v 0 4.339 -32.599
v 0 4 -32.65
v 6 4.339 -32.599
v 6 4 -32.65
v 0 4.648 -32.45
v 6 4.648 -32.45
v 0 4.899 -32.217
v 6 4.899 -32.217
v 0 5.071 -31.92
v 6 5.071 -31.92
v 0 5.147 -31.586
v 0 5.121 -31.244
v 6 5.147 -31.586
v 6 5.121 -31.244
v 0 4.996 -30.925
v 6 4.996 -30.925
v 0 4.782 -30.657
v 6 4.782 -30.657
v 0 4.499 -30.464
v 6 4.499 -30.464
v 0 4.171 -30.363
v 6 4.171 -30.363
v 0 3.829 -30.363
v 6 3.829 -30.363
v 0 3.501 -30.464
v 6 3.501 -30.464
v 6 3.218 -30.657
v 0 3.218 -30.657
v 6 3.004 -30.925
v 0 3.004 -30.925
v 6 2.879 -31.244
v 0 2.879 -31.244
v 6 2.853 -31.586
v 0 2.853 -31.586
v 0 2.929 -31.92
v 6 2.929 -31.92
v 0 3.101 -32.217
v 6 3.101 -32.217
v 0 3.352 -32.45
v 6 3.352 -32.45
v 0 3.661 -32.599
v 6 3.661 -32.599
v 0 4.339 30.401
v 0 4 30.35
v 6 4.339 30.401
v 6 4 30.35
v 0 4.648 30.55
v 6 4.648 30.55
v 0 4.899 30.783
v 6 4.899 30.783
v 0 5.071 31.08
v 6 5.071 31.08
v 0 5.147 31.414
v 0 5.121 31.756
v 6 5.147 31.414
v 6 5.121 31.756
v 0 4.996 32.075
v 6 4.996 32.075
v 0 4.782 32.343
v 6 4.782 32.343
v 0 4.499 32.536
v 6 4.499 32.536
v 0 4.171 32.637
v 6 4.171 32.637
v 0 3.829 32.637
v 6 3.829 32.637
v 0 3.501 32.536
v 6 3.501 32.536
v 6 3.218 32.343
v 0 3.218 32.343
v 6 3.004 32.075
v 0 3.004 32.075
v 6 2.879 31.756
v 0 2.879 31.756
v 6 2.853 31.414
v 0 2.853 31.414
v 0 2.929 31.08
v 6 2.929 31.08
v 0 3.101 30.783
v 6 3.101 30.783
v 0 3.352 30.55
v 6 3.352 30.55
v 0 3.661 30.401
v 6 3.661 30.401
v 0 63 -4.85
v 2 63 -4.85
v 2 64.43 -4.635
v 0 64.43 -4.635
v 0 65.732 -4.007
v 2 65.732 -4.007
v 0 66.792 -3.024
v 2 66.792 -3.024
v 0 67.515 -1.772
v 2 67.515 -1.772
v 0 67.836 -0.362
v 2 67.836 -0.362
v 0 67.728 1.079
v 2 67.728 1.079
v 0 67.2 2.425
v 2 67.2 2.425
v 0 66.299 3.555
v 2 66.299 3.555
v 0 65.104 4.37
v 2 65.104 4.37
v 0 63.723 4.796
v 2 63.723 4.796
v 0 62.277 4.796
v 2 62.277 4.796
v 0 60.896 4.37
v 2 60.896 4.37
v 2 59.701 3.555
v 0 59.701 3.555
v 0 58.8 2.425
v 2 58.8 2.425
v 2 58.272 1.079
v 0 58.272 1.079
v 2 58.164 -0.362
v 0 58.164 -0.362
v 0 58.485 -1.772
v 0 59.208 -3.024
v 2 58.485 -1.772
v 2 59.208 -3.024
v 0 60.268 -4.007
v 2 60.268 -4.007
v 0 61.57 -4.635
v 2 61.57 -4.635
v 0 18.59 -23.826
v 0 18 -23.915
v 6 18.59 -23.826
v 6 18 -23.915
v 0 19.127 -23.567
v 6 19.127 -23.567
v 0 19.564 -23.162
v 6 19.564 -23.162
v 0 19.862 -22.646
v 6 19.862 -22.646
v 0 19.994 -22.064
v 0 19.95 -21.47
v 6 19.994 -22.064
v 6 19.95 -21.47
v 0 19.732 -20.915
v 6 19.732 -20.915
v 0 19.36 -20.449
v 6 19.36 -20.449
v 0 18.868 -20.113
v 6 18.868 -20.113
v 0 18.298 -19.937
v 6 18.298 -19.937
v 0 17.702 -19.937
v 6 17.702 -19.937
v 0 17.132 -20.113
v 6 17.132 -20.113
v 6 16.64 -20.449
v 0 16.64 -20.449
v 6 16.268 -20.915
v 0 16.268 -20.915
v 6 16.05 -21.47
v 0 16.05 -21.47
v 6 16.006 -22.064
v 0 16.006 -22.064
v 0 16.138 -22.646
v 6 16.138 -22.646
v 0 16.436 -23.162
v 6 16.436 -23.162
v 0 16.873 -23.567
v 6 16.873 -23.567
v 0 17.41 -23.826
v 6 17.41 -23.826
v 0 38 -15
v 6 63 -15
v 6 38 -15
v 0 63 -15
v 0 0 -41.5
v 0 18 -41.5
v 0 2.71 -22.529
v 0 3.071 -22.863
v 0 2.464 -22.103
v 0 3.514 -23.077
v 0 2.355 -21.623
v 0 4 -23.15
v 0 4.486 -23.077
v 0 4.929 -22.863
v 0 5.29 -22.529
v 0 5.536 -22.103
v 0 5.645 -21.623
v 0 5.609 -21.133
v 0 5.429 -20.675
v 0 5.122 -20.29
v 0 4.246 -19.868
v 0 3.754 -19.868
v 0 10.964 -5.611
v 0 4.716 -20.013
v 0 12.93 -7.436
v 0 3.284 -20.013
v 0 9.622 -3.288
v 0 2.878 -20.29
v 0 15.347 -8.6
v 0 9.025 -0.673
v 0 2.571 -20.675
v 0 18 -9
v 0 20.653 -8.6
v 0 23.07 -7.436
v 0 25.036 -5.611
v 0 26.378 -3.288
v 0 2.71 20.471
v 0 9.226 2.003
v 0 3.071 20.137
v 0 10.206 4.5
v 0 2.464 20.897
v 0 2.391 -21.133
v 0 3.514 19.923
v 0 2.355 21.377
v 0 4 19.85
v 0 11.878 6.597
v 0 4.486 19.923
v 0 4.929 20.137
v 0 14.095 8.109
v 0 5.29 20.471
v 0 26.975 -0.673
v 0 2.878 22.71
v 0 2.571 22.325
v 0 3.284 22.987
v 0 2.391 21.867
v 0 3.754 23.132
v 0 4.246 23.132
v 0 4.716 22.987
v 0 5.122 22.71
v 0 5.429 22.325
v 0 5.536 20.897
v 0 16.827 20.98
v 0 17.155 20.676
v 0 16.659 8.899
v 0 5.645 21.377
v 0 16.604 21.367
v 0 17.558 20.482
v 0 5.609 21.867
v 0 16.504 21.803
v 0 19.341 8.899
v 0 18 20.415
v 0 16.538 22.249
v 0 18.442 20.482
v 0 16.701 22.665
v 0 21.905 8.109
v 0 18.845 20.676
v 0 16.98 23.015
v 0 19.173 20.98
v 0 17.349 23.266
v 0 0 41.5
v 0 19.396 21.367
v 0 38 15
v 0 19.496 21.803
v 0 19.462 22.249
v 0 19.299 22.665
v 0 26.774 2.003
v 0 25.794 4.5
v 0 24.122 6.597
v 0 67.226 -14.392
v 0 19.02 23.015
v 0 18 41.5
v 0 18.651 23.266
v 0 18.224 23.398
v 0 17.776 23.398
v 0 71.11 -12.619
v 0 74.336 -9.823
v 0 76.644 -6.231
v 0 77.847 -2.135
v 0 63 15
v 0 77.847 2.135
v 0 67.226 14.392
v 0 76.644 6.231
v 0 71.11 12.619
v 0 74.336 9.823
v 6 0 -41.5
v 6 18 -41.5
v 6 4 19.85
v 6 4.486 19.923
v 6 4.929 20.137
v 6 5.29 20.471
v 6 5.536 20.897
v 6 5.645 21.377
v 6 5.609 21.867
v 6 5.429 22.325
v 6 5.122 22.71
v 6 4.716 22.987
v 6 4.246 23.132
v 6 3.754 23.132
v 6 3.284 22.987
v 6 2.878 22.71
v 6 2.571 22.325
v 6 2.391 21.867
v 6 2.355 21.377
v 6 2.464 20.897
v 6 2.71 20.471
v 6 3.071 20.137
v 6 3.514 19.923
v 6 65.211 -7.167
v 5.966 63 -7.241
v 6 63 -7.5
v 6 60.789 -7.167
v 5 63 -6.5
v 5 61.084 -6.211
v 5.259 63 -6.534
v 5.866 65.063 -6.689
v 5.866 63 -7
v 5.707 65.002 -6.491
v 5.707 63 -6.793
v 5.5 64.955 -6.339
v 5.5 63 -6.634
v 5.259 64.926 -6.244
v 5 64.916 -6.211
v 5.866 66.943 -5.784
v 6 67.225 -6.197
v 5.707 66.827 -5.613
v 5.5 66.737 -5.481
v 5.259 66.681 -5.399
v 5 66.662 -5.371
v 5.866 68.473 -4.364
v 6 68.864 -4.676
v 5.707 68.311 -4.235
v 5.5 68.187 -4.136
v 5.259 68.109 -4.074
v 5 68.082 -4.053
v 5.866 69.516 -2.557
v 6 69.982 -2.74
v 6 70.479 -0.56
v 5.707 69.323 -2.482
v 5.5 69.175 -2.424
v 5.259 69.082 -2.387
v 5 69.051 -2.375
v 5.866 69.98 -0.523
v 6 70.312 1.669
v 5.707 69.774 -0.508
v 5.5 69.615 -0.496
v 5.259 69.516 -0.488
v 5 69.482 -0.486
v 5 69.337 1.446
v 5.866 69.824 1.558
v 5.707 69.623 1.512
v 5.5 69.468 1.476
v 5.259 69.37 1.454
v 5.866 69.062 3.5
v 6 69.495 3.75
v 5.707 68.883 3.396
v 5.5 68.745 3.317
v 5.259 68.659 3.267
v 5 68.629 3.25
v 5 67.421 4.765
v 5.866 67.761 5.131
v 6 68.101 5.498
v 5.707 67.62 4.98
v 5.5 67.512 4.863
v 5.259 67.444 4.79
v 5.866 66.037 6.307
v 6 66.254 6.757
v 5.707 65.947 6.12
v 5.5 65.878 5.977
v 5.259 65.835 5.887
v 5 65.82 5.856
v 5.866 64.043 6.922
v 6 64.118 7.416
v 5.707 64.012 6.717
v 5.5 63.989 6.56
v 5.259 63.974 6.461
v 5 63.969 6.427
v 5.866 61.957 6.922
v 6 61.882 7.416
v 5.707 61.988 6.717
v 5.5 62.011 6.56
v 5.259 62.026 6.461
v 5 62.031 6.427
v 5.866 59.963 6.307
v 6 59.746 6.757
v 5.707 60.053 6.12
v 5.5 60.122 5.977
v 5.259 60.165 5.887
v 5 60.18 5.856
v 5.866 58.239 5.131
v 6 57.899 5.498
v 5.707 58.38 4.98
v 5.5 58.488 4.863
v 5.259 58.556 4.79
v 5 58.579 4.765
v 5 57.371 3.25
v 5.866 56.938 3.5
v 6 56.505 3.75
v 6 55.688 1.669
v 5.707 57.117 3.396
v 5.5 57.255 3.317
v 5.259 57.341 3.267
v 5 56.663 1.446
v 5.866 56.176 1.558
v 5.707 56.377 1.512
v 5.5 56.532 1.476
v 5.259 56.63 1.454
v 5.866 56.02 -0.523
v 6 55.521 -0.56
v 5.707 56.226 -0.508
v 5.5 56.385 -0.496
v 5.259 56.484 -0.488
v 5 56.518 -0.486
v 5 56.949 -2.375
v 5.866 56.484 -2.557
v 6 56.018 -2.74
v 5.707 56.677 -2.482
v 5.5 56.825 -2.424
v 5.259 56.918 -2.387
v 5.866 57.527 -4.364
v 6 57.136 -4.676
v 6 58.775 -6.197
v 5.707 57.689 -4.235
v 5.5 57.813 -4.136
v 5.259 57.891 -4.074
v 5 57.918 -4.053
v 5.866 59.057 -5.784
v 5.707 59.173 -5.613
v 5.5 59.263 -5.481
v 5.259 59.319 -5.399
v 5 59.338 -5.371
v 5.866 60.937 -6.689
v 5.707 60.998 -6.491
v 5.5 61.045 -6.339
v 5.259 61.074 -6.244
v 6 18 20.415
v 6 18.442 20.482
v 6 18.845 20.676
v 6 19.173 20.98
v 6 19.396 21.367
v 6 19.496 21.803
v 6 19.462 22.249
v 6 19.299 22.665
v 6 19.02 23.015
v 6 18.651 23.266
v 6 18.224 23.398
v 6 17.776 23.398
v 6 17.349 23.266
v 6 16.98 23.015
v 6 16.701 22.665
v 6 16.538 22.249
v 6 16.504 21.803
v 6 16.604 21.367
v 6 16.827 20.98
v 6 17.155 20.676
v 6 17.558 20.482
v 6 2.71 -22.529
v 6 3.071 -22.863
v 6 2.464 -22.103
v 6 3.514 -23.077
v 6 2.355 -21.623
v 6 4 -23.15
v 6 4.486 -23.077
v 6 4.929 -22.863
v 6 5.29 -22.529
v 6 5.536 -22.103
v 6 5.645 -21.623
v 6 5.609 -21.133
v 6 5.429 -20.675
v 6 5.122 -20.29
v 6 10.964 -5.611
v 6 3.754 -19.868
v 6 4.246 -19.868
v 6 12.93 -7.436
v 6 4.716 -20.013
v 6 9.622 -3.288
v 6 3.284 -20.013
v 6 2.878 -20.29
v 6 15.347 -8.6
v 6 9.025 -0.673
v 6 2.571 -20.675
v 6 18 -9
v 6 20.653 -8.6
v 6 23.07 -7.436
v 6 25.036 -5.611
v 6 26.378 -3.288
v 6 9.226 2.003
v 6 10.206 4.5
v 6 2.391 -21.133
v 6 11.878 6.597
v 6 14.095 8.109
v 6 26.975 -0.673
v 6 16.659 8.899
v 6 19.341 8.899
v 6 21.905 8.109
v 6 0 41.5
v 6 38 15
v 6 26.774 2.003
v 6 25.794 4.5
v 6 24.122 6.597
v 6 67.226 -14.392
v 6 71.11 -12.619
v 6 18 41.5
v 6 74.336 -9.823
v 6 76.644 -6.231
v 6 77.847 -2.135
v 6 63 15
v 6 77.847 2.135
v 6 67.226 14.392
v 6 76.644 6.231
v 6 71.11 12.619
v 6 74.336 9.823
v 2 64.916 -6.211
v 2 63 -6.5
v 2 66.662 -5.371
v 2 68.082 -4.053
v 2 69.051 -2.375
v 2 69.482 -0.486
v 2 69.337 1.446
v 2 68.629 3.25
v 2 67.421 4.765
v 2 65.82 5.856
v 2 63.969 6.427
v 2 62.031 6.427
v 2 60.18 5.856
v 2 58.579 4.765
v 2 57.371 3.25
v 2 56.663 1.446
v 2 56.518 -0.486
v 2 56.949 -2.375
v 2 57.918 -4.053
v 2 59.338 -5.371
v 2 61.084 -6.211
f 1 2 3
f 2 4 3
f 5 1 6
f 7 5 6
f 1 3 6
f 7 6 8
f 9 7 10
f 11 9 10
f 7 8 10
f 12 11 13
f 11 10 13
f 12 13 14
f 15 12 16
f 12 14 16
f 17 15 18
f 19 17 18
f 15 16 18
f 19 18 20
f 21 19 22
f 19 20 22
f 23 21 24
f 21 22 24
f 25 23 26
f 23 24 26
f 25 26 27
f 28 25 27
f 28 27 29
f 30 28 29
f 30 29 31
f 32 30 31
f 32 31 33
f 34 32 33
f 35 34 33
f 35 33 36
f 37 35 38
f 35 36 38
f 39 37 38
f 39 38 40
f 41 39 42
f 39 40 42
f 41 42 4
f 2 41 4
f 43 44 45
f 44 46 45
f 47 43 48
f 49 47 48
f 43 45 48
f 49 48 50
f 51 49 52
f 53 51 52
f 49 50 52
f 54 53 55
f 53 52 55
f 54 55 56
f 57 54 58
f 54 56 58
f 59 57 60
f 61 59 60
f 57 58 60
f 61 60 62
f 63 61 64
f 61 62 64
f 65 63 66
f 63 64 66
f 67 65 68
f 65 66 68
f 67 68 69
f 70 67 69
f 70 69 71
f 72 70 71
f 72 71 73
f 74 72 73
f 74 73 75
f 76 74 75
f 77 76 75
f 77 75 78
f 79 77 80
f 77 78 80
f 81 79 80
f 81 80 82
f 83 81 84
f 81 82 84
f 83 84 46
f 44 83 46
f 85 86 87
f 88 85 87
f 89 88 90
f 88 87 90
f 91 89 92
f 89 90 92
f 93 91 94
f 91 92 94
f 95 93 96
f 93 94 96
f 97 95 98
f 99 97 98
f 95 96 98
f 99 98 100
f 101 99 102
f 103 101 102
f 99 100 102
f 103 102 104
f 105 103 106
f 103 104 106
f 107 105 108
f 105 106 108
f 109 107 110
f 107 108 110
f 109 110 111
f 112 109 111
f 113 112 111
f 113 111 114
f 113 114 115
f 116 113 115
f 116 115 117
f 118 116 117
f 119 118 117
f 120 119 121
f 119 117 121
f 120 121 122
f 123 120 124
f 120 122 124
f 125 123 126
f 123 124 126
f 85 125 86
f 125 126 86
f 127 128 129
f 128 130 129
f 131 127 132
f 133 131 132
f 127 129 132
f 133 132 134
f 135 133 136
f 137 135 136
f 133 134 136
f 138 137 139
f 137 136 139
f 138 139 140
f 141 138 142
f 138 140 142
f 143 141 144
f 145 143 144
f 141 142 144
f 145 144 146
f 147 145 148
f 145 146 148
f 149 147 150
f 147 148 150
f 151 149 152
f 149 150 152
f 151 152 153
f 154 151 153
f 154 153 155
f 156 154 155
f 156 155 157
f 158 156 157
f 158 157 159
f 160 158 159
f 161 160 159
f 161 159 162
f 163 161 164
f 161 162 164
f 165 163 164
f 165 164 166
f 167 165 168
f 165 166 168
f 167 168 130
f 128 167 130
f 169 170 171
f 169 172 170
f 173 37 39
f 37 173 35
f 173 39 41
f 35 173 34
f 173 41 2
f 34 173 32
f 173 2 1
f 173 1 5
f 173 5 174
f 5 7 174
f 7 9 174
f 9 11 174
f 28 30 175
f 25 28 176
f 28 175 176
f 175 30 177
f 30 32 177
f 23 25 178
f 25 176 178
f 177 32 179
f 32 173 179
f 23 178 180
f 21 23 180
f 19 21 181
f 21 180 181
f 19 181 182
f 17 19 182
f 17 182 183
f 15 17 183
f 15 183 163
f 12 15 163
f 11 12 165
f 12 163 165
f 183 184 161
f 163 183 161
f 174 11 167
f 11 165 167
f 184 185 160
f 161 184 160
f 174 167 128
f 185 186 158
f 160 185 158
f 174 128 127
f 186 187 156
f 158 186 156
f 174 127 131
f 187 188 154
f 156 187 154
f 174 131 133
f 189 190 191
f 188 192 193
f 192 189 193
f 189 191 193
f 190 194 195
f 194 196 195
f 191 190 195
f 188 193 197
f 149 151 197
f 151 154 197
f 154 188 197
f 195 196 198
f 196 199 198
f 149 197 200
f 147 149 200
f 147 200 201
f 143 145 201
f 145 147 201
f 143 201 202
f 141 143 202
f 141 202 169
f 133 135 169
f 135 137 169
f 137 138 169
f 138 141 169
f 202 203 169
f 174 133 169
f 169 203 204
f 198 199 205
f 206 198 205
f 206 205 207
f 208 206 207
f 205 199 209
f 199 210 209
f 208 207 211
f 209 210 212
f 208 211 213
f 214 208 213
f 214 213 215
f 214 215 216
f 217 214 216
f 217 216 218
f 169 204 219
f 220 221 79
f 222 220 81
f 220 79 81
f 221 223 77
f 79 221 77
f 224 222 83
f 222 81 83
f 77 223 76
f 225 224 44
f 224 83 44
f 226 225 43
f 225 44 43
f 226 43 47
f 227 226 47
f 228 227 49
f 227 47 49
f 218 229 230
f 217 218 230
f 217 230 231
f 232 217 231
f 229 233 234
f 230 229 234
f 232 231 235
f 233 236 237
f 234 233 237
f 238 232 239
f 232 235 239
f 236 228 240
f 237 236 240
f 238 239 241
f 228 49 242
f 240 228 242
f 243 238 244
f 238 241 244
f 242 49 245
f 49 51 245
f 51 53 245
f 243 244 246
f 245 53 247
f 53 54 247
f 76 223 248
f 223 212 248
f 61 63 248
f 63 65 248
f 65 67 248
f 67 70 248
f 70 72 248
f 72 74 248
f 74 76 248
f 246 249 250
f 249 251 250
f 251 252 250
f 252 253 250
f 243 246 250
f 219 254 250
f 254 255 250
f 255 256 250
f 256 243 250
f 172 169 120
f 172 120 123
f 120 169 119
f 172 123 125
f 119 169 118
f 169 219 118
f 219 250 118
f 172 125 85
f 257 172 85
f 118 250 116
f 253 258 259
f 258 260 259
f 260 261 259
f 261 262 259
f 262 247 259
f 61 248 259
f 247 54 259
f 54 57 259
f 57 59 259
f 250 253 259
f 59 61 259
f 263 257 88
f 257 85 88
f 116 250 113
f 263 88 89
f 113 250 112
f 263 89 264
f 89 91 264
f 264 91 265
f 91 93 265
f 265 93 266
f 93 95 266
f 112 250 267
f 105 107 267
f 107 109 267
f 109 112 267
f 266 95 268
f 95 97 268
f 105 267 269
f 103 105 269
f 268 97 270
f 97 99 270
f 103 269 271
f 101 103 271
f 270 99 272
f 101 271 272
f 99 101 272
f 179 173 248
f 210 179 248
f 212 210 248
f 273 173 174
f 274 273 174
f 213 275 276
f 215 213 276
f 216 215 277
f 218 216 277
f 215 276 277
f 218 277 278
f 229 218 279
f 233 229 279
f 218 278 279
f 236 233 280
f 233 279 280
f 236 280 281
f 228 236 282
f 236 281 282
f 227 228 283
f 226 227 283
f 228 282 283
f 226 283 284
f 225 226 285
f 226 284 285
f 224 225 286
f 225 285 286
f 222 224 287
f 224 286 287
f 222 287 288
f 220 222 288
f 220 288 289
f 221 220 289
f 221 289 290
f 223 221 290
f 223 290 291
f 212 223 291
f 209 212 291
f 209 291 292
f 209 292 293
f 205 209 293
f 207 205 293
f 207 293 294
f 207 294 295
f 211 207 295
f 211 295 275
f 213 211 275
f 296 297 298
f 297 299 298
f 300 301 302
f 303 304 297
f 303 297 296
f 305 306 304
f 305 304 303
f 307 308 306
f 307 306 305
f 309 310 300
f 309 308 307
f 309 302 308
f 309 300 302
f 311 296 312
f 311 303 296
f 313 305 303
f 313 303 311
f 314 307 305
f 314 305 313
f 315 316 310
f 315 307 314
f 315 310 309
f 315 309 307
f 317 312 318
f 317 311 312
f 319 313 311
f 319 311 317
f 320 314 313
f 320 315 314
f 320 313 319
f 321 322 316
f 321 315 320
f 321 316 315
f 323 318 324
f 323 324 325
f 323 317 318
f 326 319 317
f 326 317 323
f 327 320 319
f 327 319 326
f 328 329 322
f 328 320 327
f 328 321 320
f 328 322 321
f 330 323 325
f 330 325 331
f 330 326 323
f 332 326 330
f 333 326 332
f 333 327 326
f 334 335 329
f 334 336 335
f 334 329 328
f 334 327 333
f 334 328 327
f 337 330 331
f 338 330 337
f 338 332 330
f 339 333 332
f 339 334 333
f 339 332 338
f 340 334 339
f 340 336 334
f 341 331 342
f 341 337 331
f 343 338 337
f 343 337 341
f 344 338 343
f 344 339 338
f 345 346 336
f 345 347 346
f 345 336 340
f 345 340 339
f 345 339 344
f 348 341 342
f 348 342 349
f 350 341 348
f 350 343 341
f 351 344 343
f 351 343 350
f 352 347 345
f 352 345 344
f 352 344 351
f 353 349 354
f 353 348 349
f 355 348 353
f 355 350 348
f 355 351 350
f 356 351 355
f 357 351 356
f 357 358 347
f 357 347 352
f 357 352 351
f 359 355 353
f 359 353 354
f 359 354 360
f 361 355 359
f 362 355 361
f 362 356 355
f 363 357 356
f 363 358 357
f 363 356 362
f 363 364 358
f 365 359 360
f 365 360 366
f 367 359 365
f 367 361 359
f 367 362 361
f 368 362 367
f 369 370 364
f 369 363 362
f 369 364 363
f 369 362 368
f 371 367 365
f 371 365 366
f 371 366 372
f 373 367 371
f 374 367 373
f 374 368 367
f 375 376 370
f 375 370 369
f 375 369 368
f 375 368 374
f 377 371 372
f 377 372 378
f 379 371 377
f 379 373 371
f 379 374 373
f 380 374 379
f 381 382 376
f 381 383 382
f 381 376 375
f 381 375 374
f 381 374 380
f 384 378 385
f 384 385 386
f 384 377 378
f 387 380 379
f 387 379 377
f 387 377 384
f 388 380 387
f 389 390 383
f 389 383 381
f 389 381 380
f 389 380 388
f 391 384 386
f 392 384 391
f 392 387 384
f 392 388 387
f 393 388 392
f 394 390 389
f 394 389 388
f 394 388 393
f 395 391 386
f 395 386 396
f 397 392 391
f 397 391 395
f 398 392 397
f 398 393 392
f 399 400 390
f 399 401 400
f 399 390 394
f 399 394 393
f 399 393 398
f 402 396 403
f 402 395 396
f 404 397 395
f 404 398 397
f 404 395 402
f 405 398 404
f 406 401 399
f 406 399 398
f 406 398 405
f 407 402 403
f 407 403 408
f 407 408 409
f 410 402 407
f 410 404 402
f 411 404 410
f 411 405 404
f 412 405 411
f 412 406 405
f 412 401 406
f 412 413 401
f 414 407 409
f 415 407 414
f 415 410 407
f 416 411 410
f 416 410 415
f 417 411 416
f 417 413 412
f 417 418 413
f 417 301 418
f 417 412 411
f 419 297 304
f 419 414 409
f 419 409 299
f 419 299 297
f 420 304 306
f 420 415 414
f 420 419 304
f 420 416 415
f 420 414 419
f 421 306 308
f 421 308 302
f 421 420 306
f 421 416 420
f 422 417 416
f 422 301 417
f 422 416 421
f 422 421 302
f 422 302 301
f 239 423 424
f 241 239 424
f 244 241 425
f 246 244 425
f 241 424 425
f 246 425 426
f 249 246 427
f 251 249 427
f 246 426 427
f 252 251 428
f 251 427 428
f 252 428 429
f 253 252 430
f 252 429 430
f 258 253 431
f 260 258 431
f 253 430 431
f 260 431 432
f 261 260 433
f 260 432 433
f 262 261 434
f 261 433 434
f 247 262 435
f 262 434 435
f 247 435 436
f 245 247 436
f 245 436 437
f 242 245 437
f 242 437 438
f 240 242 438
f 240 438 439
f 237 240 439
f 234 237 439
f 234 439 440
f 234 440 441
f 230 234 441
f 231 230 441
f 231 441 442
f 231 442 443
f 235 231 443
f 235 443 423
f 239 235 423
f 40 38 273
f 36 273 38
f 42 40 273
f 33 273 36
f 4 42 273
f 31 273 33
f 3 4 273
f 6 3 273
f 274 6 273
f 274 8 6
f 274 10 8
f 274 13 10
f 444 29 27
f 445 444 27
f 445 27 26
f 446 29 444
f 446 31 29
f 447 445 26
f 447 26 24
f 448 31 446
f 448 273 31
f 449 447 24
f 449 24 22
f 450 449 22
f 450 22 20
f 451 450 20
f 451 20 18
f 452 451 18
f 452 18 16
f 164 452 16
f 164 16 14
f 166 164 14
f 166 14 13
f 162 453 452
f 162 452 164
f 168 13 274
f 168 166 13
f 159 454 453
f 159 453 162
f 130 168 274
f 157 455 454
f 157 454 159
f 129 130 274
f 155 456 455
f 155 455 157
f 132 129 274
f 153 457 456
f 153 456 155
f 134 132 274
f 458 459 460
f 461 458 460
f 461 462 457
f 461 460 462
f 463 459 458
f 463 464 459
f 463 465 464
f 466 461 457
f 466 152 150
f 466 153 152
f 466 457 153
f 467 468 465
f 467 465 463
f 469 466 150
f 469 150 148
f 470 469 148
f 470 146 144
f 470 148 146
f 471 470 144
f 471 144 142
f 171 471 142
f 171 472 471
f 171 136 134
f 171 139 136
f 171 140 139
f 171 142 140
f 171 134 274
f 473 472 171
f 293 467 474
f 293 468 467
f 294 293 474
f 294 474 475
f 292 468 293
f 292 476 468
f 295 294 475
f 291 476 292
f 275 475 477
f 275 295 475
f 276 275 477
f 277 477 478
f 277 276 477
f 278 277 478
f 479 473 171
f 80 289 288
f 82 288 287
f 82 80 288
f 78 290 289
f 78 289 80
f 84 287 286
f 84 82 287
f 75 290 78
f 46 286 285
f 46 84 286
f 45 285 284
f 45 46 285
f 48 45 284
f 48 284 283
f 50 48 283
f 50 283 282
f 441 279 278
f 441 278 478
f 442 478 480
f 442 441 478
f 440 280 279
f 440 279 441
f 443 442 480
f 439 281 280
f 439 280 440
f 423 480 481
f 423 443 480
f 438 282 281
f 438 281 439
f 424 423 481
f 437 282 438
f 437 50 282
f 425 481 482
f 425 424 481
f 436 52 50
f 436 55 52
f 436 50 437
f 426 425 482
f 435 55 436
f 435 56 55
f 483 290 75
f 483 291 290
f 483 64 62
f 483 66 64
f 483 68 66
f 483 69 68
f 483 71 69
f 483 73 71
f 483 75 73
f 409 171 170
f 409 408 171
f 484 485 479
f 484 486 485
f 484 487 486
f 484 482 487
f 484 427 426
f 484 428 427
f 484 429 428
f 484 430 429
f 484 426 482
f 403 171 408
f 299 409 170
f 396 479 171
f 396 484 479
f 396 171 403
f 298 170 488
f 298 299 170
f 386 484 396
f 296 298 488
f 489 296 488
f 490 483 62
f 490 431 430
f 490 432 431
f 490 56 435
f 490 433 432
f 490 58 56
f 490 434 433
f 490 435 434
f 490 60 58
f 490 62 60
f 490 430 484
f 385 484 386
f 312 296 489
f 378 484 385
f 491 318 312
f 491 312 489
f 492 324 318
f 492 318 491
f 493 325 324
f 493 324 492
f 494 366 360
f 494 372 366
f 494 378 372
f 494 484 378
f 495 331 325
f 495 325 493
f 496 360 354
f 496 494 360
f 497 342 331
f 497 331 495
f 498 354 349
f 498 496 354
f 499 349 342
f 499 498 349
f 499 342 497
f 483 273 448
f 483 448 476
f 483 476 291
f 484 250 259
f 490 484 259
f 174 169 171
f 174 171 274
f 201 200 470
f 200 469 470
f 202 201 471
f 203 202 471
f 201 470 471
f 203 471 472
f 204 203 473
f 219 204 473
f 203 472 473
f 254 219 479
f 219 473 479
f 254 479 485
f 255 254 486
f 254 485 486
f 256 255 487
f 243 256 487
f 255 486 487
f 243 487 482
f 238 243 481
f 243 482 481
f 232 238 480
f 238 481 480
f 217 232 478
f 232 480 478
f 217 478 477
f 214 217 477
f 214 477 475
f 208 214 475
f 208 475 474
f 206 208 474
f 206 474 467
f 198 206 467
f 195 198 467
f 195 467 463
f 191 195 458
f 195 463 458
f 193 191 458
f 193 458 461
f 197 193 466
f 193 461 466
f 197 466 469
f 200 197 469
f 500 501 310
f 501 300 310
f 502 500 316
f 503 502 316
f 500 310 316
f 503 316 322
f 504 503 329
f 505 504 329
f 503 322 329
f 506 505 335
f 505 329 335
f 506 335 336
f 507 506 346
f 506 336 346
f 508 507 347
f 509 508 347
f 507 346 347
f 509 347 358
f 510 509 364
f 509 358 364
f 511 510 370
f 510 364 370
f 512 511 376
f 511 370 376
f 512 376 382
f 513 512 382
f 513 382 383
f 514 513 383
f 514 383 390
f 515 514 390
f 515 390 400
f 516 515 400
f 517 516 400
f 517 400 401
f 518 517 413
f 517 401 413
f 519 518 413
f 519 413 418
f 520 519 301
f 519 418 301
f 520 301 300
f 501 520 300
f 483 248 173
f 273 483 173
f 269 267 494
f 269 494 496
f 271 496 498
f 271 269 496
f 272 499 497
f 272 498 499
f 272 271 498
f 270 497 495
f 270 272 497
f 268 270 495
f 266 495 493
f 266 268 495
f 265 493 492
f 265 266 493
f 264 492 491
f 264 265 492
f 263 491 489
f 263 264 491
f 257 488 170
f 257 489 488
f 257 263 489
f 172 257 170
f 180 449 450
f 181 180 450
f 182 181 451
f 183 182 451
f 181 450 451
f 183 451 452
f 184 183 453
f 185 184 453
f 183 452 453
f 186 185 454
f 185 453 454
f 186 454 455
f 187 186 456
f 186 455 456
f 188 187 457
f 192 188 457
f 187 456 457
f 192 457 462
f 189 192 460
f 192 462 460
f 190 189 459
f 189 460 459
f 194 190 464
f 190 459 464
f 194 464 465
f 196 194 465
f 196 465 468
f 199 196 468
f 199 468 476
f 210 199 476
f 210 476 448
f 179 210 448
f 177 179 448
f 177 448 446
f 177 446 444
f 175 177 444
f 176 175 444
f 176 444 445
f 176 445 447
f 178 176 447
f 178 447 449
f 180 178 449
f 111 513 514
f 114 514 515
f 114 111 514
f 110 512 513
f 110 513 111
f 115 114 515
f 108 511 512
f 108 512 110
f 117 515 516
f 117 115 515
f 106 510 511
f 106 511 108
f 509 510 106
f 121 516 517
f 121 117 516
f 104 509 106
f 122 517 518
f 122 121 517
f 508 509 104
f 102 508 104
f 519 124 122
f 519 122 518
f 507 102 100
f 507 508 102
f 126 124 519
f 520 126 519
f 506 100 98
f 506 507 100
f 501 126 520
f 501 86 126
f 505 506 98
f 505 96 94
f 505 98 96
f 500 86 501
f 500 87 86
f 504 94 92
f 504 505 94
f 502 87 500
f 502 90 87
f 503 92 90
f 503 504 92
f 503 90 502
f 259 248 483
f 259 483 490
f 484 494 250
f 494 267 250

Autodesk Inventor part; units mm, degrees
ref_plane "YZ Plane" through (0, 0, 0) normal (1, 0, 0) x (0, 1, 0)
ref_plane "XZ Plane" through (0, 0, 0) normal (0, 1, 0) x (-1, 0, 0)
ref_plane "XY Plane" through (0, 0, 0) normal (0, 0, 1) x (1, 0, 0)
sketch "스케치1" plane through (0, 0, 0) normal (1, 0, 0) x (0, 1, 0)
  line L0 (0, -41.5) -> (18, -41.5)
  line L1 (18, -41.5) -> (18, 59.6584) construction
  line L2 (0, 0) -> (0, -41.5)
  line L3 (84.3904, 0) -> (-15.1692, 0) construction
  arc A0 (63, -15) -> (78, 0) centre (63, 0) ccw
  line L4 (63, -15) -> (38, -15)
  line L5 (38, -15) -> (18, -41.5)
  line L6 (0, 41.5) -> (18, 41.5)
  line L7 (0, 0) -> (0, 41.5)
  arc A1 (78, 0) -> (63, 15) centre (63, 0) ccw
  line L8 (63, 15) -> (38, 15)
  line L9 (38, 15) -> (18, 41.5)
  dimension "d0" = 18
  dimension "d8" = 45
  dimension "d9" = 25
extrude "돌출1" add sketch "스케치1" along normal blind 6
sketch "스케치2" plane through (6, 0, 0) normal (1, 0, 0) x (0, 0, -1)
  line L0 (-58.8675, 4) -> (65.7315, 4) construction
  line L1 (-41.5, 0) -> (41.5, 0) projected
  circle A0 centre (31.5, 4) radius 1.15
  circle A1 centre (21.5, 4) radius 1.65
  line L2 (41.5, 0) -> (41.5, 18) projected
  line L3 (0, 13.8041) -> (0, -7.7982) construction
  circle A2 centre (-31.5, 4) radius 1.15
  circle A3 centre (-21.5, 4) radius 1.65
  point P0 (0, 0)
  dimension "d12" = 4
  dimension "d13" = 2.3
  dimension "d14" = 3.3
  dimension "d15" = 10
  dimension "d16" = 20
  dimension "d32" = 21.5
extrude "돌출2" cut sketch "스케치2" against normal blind 6
sketch "스케치3" plane through (6, 0, 0) normal (1, 0, 0) x (0, 0, -1)
  line L0 (-41.5, 18) -> (-41.5, 0) projected
  line L1 (41.5, 0) -> (41.5, 18) projected
  line L2 (-41.5, 18) -> (41.5, 18) construction
  line L3 (-21.915, 37.5775) -> (-21.915, 10.4705) construction
  line L4 (0, 43.7434) -> (0, -15.8221) construction
  line L5 (21.915, 37.5775) -> (21.915, 10.4705) construction
  circle A0 centre (-21.915, 18) radius 1.5
  circle A1 centre (21.915, 18) radius 2
  circle A2 centre (0, 18) radius 9
  point P0 (0, 0)
  dimension "d19" = 21.915
  dimension "d20" = 3
  dimension "d21" = 4
  dimension "d22" = 18
extrude "돌출3" cut sketch "스케치3" against normal blind 6
sketch "스케치4" plane through (6, 0, 0) normal (1, 0, 0) x (0, 0, -1)
  arc A0 (15, 63) -> (-15, 63) centre (0, 63) ccw projected
  circle A1 centre (0, 63) radius 6.5
  point P0 (0, 0)
  dimension "d25" = 13
extrude "돌출4" cut sketch "스케치4" against normal blind 4
sketch "스케치5" plane through (2, 63, 0) normal (1, 0, 0) x (0, 0, -1)
  circle A0 centre (0, 0) radius 4.85
  point P0 (0, -63)
  dimension "d28" = 9.7
extrude "돌출5" cut sketch "스케치5" against normal blind 2
fillet "모깎기1" radius 1 1 edges at (6, 63, 6.5)
properties part number "탑(모터쪽옆면수정)"
